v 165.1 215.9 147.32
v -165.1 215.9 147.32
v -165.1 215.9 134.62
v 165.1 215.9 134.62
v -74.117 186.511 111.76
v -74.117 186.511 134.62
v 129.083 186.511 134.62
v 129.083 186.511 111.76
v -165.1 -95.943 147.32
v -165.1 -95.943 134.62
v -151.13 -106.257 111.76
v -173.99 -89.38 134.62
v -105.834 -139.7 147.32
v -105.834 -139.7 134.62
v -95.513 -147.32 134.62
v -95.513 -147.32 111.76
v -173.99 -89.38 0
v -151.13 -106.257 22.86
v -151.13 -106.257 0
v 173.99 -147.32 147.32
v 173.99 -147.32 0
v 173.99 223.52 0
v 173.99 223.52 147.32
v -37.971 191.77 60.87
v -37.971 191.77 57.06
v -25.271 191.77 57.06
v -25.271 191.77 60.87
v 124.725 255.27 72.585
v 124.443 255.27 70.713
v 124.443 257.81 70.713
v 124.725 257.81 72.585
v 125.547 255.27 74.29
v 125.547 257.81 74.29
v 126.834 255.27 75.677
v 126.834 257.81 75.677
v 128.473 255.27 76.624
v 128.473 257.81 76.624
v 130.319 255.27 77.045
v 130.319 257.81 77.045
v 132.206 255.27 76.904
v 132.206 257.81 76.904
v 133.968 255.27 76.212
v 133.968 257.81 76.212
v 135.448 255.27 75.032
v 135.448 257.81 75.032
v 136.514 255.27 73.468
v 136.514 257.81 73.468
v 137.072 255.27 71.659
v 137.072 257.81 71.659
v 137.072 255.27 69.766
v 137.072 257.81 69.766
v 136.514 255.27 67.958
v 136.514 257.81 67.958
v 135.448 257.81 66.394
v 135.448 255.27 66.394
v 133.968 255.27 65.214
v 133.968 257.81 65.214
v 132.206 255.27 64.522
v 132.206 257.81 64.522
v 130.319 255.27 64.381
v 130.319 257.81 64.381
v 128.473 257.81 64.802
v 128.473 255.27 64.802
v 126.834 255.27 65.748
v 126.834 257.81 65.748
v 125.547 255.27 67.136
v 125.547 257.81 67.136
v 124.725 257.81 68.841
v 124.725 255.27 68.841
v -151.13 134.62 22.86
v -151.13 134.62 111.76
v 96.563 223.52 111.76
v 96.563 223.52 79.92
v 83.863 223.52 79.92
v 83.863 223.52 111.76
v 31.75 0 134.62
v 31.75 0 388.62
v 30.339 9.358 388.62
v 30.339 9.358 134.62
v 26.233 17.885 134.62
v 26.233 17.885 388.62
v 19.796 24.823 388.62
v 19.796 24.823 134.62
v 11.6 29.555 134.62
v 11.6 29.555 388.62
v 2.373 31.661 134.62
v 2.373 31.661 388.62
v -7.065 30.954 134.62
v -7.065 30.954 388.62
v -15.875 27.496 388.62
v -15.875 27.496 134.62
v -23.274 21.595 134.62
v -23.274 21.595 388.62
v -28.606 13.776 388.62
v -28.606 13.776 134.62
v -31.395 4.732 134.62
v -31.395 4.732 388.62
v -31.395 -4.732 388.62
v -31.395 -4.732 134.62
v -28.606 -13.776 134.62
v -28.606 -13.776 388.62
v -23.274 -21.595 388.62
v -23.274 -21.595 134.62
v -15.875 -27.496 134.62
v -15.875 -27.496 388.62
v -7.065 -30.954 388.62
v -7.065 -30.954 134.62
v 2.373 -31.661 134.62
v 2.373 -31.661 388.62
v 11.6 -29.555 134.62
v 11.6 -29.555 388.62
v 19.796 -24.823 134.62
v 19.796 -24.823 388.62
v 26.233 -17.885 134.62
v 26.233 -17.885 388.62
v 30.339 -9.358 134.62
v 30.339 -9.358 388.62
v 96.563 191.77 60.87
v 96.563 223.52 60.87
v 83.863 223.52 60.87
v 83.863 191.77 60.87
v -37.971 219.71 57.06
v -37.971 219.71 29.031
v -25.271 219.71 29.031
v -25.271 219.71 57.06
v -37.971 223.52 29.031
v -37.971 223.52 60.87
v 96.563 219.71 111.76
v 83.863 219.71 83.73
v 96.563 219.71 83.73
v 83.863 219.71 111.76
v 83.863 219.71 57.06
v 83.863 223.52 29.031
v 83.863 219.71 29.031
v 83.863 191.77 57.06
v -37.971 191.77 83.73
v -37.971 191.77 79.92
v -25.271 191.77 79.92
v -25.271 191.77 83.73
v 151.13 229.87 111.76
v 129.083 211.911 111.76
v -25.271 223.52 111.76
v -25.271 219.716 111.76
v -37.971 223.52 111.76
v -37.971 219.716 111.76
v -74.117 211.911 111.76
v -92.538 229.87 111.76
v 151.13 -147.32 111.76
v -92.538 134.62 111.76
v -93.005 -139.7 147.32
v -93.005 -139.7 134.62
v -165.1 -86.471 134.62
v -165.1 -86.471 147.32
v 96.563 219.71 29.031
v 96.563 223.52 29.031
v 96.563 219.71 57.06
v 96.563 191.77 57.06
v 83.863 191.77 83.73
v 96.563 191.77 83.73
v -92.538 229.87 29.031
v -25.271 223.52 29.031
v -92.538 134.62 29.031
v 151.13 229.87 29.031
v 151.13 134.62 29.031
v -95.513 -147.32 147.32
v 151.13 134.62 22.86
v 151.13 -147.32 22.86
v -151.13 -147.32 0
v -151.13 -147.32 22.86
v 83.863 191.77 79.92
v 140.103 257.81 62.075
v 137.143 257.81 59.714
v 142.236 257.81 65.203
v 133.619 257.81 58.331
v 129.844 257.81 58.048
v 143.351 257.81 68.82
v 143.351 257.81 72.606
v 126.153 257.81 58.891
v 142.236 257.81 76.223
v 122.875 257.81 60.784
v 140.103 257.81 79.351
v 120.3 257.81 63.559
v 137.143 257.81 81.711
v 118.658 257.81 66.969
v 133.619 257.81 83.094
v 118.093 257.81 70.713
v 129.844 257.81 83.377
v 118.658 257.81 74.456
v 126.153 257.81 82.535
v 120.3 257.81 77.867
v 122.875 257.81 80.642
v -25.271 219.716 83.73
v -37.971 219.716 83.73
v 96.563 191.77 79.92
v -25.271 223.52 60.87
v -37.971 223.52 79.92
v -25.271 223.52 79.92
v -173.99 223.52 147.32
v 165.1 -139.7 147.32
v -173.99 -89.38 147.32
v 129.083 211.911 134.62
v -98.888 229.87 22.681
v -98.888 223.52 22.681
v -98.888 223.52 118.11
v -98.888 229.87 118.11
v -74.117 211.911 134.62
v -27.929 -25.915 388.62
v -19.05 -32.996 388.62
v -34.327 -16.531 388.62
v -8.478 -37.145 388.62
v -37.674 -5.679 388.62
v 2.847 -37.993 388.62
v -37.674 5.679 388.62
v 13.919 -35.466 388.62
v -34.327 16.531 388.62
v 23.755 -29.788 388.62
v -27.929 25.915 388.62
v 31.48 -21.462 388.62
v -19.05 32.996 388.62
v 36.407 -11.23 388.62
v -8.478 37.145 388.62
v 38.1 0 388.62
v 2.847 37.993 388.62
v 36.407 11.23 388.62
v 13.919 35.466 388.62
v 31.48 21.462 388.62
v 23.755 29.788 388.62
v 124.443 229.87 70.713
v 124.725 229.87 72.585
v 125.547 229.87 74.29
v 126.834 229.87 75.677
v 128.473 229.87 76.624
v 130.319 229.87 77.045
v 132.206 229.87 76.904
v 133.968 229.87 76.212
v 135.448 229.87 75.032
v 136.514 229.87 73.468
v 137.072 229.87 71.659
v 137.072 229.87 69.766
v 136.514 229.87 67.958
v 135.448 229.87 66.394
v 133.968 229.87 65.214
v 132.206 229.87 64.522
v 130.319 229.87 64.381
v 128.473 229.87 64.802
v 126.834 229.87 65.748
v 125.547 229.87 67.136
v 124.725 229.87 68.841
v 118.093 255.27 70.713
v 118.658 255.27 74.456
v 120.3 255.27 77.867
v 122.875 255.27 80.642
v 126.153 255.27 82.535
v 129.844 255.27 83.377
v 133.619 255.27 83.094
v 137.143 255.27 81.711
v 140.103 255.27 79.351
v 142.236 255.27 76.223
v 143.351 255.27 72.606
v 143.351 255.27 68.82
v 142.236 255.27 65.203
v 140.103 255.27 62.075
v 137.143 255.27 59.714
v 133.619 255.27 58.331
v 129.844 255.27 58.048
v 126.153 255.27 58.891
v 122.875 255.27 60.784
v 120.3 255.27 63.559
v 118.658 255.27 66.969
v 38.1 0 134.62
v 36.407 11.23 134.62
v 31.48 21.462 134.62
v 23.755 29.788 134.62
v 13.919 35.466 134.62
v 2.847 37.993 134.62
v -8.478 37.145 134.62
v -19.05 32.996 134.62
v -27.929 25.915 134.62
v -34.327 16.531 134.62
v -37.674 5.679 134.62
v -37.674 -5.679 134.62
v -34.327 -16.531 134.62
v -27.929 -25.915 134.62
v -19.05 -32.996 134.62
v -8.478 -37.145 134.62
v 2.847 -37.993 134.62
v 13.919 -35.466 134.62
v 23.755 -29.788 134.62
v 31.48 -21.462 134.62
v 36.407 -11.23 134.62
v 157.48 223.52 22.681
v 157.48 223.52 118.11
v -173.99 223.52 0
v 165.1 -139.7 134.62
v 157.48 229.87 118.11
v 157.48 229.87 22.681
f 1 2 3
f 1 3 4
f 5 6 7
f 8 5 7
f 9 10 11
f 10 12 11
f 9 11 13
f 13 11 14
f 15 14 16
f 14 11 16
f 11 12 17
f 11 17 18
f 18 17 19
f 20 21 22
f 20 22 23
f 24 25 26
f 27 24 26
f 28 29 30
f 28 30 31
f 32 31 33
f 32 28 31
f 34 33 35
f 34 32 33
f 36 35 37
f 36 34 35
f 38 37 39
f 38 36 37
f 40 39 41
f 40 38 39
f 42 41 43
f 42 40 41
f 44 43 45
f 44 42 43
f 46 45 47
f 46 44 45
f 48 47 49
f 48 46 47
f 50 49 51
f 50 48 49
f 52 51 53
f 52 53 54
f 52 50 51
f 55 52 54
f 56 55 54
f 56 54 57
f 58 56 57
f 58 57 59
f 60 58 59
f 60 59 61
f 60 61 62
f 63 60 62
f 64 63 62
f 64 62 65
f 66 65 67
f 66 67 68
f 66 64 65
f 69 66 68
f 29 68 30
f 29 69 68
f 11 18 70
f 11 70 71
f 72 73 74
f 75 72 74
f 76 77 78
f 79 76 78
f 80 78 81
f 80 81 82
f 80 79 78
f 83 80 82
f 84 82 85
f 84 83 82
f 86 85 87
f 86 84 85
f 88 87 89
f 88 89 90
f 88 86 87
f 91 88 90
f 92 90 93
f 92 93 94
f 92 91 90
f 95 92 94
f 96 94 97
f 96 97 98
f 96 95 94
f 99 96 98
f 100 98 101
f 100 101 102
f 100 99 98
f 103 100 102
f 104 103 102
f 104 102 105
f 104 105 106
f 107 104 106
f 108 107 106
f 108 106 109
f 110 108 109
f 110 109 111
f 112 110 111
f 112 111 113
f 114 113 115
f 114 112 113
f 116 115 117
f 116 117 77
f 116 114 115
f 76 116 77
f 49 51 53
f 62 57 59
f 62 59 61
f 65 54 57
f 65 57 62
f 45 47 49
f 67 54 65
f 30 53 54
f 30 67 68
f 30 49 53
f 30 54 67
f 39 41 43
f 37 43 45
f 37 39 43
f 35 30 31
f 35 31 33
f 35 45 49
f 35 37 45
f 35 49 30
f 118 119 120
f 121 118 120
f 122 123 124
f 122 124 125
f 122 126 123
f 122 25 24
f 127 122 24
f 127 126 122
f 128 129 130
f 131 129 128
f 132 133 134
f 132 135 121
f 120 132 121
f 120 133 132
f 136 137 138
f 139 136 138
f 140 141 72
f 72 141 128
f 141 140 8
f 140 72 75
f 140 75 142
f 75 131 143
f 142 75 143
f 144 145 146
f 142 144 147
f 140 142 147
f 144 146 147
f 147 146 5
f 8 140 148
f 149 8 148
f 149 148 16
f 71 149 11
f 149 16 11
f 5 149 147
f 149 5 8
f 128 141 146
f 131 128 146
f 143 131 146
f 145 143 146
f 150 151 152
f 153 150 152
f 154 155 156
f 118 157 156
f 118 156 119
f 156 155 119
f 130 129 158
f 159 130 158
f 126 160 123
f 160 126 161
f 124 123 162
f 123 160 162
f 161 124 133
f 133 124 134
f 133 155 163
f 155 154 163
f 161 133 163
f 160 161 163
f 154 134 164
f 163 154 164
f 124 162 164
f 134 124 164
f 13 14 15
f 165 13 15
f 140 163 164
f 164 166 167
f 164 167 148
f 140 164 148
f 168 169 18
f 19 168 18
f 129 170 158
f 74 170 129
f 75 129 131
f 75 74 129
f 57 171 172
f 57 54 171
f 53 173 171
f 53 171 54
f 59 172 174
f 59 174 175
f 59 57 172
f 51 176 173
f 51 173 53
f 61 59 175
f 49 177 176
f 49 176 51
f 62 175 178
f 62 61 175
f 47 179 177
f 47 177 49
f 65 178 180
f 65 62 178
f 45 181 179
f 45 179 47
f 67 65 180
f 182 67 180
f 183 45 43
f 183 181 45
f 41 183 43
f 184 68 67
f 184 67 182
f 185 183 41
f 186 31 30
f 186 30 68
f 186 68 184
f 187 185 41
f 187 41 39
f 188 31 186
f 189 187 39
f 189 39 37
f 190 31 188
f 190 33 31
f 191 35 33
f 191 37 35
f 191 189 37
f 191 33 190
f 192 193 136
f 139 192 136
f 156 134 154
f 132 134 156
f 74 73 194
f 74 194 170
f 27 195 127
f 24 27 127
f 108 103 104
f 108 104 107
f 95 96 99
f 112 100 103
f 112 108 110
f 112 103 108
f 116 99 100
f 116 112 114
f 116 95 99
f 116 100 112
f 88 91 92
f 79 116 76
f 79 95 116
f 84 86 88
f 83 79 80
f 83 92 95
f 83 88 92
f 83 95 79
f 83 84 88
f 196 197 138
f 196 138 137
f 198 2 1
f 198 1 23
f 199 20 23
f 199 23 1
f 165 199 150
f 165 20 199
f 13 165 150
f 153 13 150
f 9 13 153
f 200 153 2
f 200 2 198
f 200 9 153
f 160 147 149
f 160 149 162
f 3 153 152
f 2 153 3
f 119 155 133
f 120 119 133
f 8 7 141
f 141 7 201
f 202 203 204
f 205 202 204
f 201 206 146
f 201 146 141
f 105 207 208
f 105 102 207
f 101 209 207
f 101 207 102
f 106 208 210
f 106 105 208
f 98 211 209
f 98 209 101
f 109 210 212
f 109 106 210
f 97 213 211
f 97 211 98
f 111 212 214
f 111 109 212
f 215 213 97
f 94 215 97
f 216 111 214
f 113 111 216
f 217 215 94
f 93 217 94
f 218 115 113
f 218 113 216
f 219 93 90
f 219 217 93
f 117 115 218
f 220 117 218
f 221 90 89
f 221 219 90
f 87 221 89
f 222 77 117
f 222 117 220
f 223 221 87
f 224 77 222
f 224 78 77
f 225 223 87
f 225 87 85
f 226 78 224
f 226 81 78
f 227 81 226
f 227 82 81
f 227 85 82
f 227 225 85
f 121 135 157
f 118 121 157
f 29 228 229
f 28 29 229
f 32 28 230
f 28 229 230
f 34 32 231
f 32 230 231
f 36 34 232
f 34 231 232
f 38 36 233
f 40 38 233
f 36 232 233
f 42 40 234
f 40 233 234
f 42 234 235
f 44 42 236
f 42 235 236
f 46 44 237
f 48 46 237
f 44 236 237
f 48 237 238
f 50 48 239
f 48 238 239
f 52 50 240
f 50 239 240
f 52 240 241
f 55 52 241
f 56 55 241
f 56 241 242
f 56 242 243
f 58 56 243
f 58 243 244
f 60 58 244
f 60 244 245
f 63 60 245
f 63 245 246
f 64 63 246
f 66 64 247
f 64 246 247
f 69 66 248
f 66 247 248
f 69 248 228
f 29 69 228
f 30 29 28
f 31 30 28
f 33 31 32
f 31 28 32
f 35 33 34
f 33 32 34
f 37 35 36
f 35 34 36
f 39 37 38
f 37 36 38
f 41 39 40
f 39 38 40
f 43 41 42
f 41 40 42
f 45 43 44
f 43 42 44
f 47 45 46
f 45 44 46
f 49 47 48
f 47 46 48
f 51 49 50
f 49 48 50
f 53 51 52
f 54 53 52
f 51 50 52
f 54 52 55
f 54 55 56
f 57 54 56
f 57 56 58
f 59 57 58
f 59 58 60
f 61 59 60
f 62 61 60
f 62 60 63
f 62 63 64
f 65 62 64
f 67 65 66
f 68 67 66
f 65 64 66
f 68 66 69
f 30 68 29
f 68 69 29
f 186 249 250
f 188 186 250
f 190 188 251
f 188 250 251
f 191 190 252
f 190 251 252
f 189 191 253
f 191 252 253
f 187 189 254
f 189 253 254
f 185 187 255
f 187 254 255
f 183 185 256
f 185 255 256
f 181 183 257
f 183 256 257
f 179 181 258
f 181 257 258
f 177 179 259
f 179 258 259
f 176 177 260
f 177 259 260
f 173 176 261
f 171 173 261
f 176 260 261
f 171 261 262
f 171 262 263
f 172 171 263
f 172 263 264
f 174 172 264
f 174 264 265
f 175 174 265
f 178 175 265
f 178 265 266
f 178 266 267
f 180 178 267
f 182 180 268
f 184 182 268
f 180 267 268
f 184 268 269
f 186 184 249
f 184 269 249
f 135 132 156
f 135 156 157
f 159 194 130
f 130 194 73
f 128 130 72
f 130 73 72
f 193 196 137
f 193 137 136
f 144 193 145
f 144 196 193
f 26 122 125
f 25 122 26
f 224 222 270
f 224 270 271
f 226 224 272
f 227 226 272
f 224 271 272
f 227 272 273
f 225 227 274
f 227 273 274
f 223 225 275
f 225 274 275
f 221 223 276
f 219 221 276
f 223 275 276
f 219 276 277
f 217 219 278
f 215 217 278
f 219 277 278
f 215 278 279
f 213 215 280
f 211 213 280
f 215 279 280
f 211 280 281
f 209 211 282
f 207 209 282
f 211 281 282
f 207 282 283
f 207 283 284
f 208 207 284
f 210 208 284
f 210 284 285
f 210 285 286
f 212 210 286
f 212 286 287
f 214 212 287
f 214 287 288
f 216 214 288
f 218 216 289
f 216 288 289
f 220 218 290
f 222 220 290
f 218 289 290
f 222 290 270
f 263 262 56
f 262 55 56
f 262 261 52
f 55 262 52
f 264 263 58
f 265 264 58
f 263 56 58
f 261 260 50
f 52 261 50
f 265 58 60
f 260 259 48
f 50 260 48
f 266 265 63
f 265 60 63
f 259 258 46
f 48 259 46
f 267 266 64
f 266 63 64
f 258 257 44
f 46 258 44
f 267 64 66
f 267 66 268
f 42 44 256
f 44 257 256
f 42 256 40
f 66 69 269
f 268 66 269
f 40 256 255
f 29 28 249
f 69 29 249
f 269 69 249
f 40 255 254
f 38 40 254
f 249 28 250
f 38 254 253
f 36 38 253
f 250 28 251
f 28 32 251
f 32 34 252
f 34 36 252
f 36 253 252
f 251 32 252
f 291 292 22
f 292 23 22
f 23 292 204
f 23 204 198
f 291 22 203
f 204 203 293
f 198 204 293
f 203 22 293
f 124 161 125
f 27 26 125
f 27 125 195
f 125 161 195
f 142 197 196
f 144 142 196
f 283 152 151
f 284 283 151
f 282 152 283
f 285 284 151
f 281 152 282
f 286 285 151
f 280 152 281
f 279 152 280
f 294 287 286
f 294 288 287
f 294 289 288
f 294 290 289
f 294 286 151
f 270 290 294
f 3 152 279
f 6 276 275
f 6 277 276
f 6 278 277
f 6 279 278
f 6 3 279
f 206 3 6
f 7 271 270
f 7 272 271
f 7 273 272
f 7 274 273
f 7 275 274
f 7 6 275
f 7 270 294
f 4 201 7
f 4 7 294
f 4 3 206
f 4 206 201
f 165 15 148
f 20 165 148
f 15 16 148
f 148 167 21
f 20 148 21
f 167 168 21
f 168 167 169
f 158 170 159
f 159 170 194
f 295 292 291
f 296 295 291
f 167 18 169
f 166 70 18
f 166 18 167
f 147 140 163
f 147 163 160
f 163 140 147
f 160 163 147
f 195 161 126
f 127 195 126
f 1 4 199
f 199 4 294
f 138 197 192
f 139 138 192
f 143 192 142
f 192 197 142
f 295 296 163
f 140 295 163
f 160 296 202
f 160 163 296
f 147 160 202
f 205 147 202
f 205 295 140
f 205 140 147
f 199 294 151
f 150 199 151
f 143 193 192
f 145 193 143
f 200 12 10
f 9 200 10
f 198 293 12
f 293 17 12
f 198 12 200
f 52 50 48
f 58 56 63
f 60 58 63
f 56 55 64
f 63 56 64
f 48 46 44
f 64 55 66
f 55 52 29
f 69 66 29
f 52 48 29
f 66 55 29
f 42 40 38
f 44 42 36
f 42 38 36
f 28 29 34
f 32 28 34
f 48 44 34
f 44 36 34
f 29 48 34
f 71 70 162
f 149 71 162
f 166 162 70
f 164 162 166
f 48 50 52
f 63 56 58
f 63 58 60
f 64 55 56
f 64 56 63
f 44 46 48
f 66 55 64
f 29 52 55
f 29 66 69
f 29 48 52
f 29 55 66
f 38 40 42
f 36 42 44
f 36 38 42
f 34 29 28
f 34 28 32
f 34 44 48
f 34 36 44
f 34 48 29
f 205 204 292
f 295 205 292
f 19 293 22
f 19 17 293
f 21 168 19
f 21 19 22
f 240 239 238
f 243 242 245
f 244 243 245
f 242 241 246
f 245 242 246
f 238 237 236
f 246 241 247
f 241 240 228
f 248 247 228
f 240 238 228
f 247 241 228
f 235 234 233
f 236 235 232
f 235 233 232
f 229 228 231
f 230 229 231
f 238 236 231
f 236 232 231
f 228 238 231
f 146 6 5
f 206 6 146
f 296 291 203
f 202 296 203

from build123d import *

# Parameters (mm, degrees)
F0_W      = 347.98
F0_H      = 294.64
F1_DEPTH  = 134.62
F3_W      = 302.26
F3_H      = 88.9
F4_DEPTH  = 307.34
F6_DEPTH  = 111.76
F9_DEPTH  = 25.4
F11_DEPTH = 12.7
F12_DEPTH = 12.7
F13_R     = 38.1
F13_R_2   = 31.75
F14_DEPTH = 254
F15_W     = 255.4974332452
F15_H     = 99.8806357384
F16_DEPTH = 254
F18_DEPTH = 254
F19_DEPTH = 254
F20_DEPTH = 76.2
F21_W     = 330.2
F21_H     = 76.2
F22_DEPTH = 12.7
F24_DEPTH = 83.82
F25_DEPTH = 25.4
F26_DEPTH = 19.05
F27_DEPTH = 19.05
F28_W     = 12.7
F28_H     = 19.05
F29_DEPTH = 33.02
F30_W     = 12.7
F30_H     = 19.05
F31_DEPTH = 33.02
F32_W     = 27.94
F32_H     = 28.0296671224
F33_DEPTH = 12.7
F34_W     = 27.94
F34_H     = 28.0296671224
F35_DEPTH = 12.7
F36_W     = 27.9462359953
F36_H     = 28.0296671224
F37_DEPTH = 12.7
F38_W     = 27.94
F38_H     = 28.0296671224
F39_DEPTH = 12.7
F41_DEPTH = 6.35
F43_DEPTH = 0.000254
F44_R     = 6.35
F45_DEPTH = 25.4
F46_R     = 12.7
F46_R_2   = 6.35
F47_DEPTH = 2.54
F48_R     = 6.35
F49_DEPTH = 2.54
F50_W     = 203.2
F50_H     = 25.4
F51_DEPTH = 25.4


with BuildPart() as f1:
    # F0 (on Top) → F1 (new body)
    with BuildSketch(Plane.XY):
        Rectangle(F0_W, F0_H)
    extrude(amount=F1_DEPTH)

    # F3 (on offset) → F4 (cut)
    with BuildSketch(Plane.XZ.offset(172.72)):
        with Locations((0, 67.31)):
            Rectangle(F3_W, F3_H)
    extrude(amount=-F4_DEPTH, mode=Mode.SUBTRACT)

    # F5 (on face) → F6 (cut)
    with BuildSketch(Plane.XY.offset(134.62)):
        Polygon((-173.99, -147.32), (-95.5131575465, -147.32), (-173.99, -89.3796235323), align=None)
    extrude(amount=-F6_DEPTH, mode=Mode.SUBTRACT)

    # F7 (on face) → F9 (cut)
    with BuildSketch(Plane.XY.offset(22.86)):
        Polygon((-151.13, -147.32), (-151.13, -106.257430598), (-173.99, -89.3796235323), (-173.99, -147.32), align=None)
    extrude(amount=-F9_DEPTH, mode=Mode.SUBTRACT)

    # F10 (on face) → F11 (join)
    with BuildSketch(Plane.XY.offset(134.62)):
        Polygon((-165.1, 139.7), (165.1, 139.7), (165.1, -139.7), (-93.0049631971, -139.7), (-105.8340007297, -139.7), (-95.5131575465, -147.32), (173.99, -147.32), (173.99, 147.32), (-173.99, 147.32), (-173.99, -89.3796235323), (-165.1, -95.9432151689), (-165.1, -86.471385759), align=None)
    extrude(amount=F11_DEPTH)

    # F10 (on face) → F12 (join)
    with BuildSketch(Plane.XY.offset(134.62)):
        Polygon((-93.0049631971, -139.7), (-165.1, -86.471385759), (-165.1, -95.9432151689), (-105.8340007297, -139.7), align=None)
    extrude(amount=F12_DEPTH)

    # F13 (on face) → F14 (join)
    with BuildSketch(Plane.XY.offset(134.62)):
        Circle(F13_R)
        Circle(F13_R_2, mode=Mode.SUBTRACT)
    extrude(amount=F14_DEPTH)

    # F15 (on face) → F16 (cut)
    with BuildSketch(Plane(origin=(0, 147.32, 0), x_dir=(-1, 0, 0), z_dir=(0, 1, 0))):
        with Locations((-35.2107621729, 78.9709836245)):
            Rectangle(F15_W, F15_H)
    extrude(amount=-F16_DEPTH, mode=Mode.SUBTRACT)

    # F17 (on face) → F18 (join)
    with BuildSketch(Plane(origin=(0, -106.68, 0), x_dir=(-1, 0, 0), z_dir=(0, 1, 0))):
        Polygon((-162.9594787955, 111.76), (-151.13, 111.76), (92.5379544497, 111.76), (92.5379544497, 128.9113014936), (-162.9594787955, 128.9113014936), align=None)
    extrude(amount=F18_DEPTH)

    # F19 (add): a face of the model
    f19_faces = [f1.faces().sort_by_distance(p)[0] for p in [
        (157.0447393978, -106.68, 70.3953328776),
    ]]
    extrude(f19_faces, amount=F19_DEPTH)

    # F20 (add): a face of the model
    f20_faces = [f1.faces().sort_by_distance(p)[0] for p in [
        (170.2112004181, 147.32, 73.66),
    ]]
    extrude(f20_faces, amount=F20_DEPTH)

    # F21 (on face) → F22 (cut)
    with BuildSketch(Plane.XY.offset(147.32)):
        with Locations((0, 177.8)):
            Rectangle(F21_W, F21_H)
    extrude(amount=-F22_DEPTH, mode=Mode.SUBTRACT)

    # F23 (on face) → F24 (join)
    with BuildSketch(Plane.XY.offset(29.0306657553)):
        Polygon((90.2130113876, 223.52), (83.8630113876, 223.52), (83.8630113876, 210.82), (96.5630113876, 210.82), (96.5630113876, 223.52), align=None)
        Polygon((-25.2709658372, 210.82), (-25.2709658372, 223.52), (-31.6209658372, 223.52), (-37.9709658372, 223.52), (-37.9709658372, 210.82), align=None)
    extrude(amount=F24_DEPTH)

    # F23 (on face) → F25 (join)
    with BuildSketch(Plane.XY.offset(29.0306657553)):
        Polygon((90.2130113876, 223.52), (83.8630113876, 223.52), (83.8630113876, 210.82), (96.5630113876, 210.82), (96.5630113876, 223.52), align=None)
        Polygon((-25.2709658372, 210.82), (-25.2709658372, 223.52), (-31.6209658372, 223.52), (-37.9709658372, 223.52), (-37.9709658372, 210.82), align=None)
    extrude(amount=F25_DEPTH)

    # F26 (add): a face of the model
    f26_faces = [f1.faces().sort_by_distance(p)[0] for p in [
        (-31.6209658372, 210.82, 70.3953328776),
    ]]
    extrude(f26_faces, amount=F26_DEPTH)

    # F27 (add): a face of the model
    f27_faces = [f1.faces().sort_by_distance(p)[0] for p in [
        (90.2130113876, 210.82, 70.3953328776),
    ]]
    extrude(f27_faces, amount=F27_DEPTH)

    # F28 (on face) → F29 (cut)
    with BuildSketch(Plane(origin=(0, 223.52, 0), x_dir=(-1, 0, 0), z_dir=(0, 1, 0))):
        with Locations((-90.2130113876, 70.3953328776)):
            Rectangle(F28_W, F28_H)
    extrude(amount=-F29_DEPTH, mode=Mode.SUBTRACT)

    # F30 (on face) → F31 (cut)
    with BuildSketch(Plane(origin=(0, 223.52, 0), x_dir=(-1, 0, 0), z_dir=(0, 1, 0))):
        with Locations((31.6209658372, 70.3953328776)):
            Rectangle(F30_W, F30_H)
    extrude(amount=-F31_DEPTH, mode=Mode.SUBTRACT)

    # F32 (on face) → F33 (cut)
    with BuildSketch(Plane(origin=(83.8630113876, 0, 0), x_dir=(0, -1, 0), z_dir=(-1, 0, 0))):
        with Locations((-205.74, 97.7451664388)):
            Rectangle(F32_W, F32_H)
    extrude(amount=-F33_DEPTH, mode=Mode.SUBTRACT)

    # F34 (on face) → F35 (cut)
    with BuildSketch(Plane(origin=(83.8630113876, 0, 0), x_dir=(0, -1, 0), z_dir=(-1, 0, 0))):
        with Locations((-205.74, 43.0454993165)):
            Rectangle(F34_W, F34_H)
    extrude(amount=-F35_DEPTH, mode=Mode.SUBTRACT)

    # F36 (on face) → F37 (cut)
    with BuildSketch(Plane(origin=(-37.9709658372, 0, 0), x_dir=(0, -1, 0), z_dir=(-1, 0, 0))):
        with Locations((-205.7431179976, 97.7451664388)):
            Rectangle(F36_W, F36_H)
    extrude(amount=-F37_DEPTH, mode=Mode.SUBTRACT)

    # F38 (on face) → F39 (cut)
    with BuildSketch(Plane(origin=(-37.9709658372, 0, 0), x_dir=(0, -1, 0), z_dir=(-1, 0, 0))):
        with Locations((-205.74, 43.0454993165)):
            Rectangle(F38_W, F38_H)
    extrude(amount=-F39_DEPTH, mode=Mode.SUBTRACT)

    # F40 (on face) → F41 (join)
    with BuildSketch(Plane(origin=(0, 223.52, 0), x_dir=(-1, 0, 0), z_dir=(0, 1, 0))):
        Polygon((98.8879544497, 22.6806657553), (98.8879544497, 111.76), (98.8879544497, 118.11), (-151.13, 118.11), (-157.48, 118.11), (-157.48, 29.0306657553), (-157.48, 22.6806657553), align=None)
        Polygon((-151.13, 29.0306657553), (-151.13, 111.76), (-96.5630113876, 111.76), (-83.8630113876, 111.76), (25.2709658372, 111.76), (37.9709658372, 111.76), (92.5379544497, 111.76), (92.5379544497, 29.0306657553), (37.9709658372, 29.0306657553), (25.2709658372, 29.0306657553), (-83.8630113876, 29.0306657553), (-96.5630113876, 29.0306657553), align=None, mode=Mode.SUBTRACT)
    extrude(amount=F41_DEPTH)

    # F50 (on face) → F51 (cut)
    with BuildSketch(Plane.XY.offset(134.62)):
        with Locations((27.4833204985, 199.2111887455)):
            Rectangle(F50_W, F50_H)
    extrude(amount=-F51_DEPTH, mode=Mode.SUBTRACT)


with BuildPart() as f43:
    # F42 (on face) → F43 (new body)
    with BuildSketch(Plane(origin=(0, 229.87, 0), x_dir=(-1, 0, 0), z_dir=(0, 1, 0))):
        Polygon((92.5379544497, 111.76), (-151.13, 111.76), (-151.13, 70.3953328776), (-151.13, 29.0306657553), (92.5379544497, 29.0306657553), align=None)
    extrude(amount=F43_DEPTH)


with BuildPart() as f45:
    # F44 (on face) → F45 (new body)
    with BuildSketch(Plane(origin=(0, 229.87, 0), x_dir=(-1, 0, 0), z_dir=(0, 1, 0))):
        with Locations((-130.7933032513, 70.7128569484)):
            Circle(F44_R)
    extrude(amount=F45_DEPTH)


with BuildPart() as f47:
    # F46 (on face) → F47 (new body)
    with BuildSketch(Plane(origin=(0, 255.27, 0), x_dir=(-1, 0, 0), z_dir=(0, 1, 0))):
        with Locations((-130.7933032513, 70.7128569484)):
            Circle(F46_R)
        with Locations((-130.7933032513, 70.7128569484)):
            Circle(F46_R_2, mode=Mode.SUBTRACT)
    extrude(amount=F47_DEPTH)


with BuildPart() as f49:
    # F48 (on face) → F49 (new body)
    with BuildSketch(Plane(origin=(0, 255.27, 0), x_dir=(-1, 0, 0), z_dir=(0, 1, 0))):
        with Locations((-130.7933032513, 70.7128569484)):
            Circle(F48_R)
    extrude(amount=F49_DEPTH)


solid = Compound([f1.part, f43.part, f45.part, f47.part, f49.part])
